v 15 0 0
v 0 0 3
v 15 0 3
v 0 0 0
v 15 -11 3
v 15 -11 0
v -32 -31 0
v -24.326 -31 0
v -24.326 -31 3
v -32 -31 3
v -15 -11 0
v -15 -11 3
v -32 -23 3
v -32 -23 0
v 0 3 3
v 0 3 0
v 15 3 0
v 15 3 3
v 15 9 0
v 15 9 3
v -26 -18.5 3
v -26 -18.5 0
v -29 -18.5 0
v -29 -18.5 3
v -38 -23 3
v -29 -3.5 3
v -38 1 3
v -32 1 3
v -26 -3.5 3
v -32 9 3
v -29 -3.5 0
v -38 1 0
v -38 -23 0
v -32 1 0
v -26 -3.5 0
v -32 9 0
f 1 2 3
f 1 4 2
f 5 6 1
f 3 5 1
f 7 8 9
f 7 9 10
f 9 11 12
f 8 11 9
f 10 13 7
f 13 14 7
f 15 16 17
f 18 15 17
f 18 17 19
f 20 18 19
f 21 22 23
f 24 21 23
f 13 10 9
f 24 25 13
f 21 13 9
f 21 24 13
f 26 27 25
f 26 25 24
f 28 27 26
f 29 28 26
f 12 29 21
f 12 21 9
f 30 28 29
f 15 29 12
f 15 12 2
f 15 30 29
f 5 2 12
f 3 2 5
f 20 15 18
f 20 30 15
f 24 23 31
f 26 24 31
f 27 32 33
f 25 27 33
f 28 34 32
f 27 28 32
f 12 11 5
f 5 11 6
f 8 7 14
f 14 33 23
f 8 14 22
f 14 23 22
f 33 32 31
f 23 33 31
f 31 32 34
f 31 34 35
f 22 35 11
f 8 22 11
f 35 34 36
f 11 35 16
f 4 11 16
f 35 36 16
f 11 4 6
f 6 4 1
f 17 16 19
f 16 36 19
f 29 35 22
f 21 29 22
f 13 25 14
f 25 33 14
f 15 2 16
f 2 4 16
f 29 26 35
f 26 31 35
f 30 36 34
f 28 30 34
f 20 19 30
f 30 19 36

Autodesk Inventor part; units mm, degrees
ref_plane "YZ Plane" through (0, 0, 0) normal (1, 0, 0) x (0, 1, 0)
ref_plane "XZ Plane" through (0, 0, 0) normal (0, 1, 0) x (-1, 0, 0)
ref_plane "XY Plane" through (0, 0, 0) normal (0, 0, 1) x (1, 0, 0)
sketch "Sketch1" plane through (0, 0, 0) normal (0, 0, 1) x (1, 0, 0)
  line L0 (0, 0) -> (-15, 0) construction
  line L1 (0, 0) -> (0, 3) projected
  line L2 (-15, 3) -> (0, 3) construction
  line L3 (-15, 0) -> (-15, 3) construction
  line L4 (15, 0) -> (15, 3) projected
  line L5 (15, 9) -> (-15, 9)
  line L6 (-15, -11) -> (15, -11)
  line L7 (15, -11) -> (15, 9)
  line L8 (0, 3) -> (15, 3)
  line L9 (0, 0) -> (15, 0)
  line L10 (0, 3) -> (0, 0)
  line L11 (15, 3) -> (15, 0)
  line L12 (-15, 9) -> (-32, 9)
  line L13 (-32, 9) -> (-32, -31)
  line L14 (-15, -11) -> (-24.3262, -31)
  line L15 (-15, -11) -> (7.0676, -11) construction
  line L16 (-24.3262, -31) -> (-32, -31)
  line L17 (-32, 1) -> (-38, 1)
  line L18 (-38, 1) -> (-38, -23)
  line L19 (-38, -23) -> (-32, -23)
  line L20 (-32, -23) -> (-32, 1)
  dimension "d0" = 20
  dimension "d1" = 6
  dimension "d3" = 15
  dimension "d4" = 17
  dimension "d5" = 40
  dimension "d6" = 115
  dimension "d7" = 47
  dimension "d8" = 6
  dimension "d9" = 8
  dimension "d10" = 8
extrude "Extrusion1" add sketch "Sketch1" along normal blind 3 contours L9 L7 L6 L14 L16 L13 L12 L5 L8 L1 | L13 L19 L18 L17
sketch "Sketch2" plane through (0, 0, 0) normal (0, 0, -1) x (-1, 0, 0)
  line L0 (26, -18.5) -> (29, -18.5)
  line L1 (29, -18.5) -> (29, -3.5)
  line L2 (29, -3.5) -> (26, -3.5)
  line L3 (26, -3.5) -> (26, -18.5)
  line L4 (-15, 9) -> (32, 9) projected
  line L5 (32, 9) -> (32, 1) projected
  point P0 (0, 0)
  dimension "d13" = 3
  dimension "d14" = 15
  dimension "d15" = 12.5
  dimension "d16" = 3
extrude "Extrusion2" cut sketch "Sketch2" against normal blind 3
properties part number "Camera bracket raiser"
